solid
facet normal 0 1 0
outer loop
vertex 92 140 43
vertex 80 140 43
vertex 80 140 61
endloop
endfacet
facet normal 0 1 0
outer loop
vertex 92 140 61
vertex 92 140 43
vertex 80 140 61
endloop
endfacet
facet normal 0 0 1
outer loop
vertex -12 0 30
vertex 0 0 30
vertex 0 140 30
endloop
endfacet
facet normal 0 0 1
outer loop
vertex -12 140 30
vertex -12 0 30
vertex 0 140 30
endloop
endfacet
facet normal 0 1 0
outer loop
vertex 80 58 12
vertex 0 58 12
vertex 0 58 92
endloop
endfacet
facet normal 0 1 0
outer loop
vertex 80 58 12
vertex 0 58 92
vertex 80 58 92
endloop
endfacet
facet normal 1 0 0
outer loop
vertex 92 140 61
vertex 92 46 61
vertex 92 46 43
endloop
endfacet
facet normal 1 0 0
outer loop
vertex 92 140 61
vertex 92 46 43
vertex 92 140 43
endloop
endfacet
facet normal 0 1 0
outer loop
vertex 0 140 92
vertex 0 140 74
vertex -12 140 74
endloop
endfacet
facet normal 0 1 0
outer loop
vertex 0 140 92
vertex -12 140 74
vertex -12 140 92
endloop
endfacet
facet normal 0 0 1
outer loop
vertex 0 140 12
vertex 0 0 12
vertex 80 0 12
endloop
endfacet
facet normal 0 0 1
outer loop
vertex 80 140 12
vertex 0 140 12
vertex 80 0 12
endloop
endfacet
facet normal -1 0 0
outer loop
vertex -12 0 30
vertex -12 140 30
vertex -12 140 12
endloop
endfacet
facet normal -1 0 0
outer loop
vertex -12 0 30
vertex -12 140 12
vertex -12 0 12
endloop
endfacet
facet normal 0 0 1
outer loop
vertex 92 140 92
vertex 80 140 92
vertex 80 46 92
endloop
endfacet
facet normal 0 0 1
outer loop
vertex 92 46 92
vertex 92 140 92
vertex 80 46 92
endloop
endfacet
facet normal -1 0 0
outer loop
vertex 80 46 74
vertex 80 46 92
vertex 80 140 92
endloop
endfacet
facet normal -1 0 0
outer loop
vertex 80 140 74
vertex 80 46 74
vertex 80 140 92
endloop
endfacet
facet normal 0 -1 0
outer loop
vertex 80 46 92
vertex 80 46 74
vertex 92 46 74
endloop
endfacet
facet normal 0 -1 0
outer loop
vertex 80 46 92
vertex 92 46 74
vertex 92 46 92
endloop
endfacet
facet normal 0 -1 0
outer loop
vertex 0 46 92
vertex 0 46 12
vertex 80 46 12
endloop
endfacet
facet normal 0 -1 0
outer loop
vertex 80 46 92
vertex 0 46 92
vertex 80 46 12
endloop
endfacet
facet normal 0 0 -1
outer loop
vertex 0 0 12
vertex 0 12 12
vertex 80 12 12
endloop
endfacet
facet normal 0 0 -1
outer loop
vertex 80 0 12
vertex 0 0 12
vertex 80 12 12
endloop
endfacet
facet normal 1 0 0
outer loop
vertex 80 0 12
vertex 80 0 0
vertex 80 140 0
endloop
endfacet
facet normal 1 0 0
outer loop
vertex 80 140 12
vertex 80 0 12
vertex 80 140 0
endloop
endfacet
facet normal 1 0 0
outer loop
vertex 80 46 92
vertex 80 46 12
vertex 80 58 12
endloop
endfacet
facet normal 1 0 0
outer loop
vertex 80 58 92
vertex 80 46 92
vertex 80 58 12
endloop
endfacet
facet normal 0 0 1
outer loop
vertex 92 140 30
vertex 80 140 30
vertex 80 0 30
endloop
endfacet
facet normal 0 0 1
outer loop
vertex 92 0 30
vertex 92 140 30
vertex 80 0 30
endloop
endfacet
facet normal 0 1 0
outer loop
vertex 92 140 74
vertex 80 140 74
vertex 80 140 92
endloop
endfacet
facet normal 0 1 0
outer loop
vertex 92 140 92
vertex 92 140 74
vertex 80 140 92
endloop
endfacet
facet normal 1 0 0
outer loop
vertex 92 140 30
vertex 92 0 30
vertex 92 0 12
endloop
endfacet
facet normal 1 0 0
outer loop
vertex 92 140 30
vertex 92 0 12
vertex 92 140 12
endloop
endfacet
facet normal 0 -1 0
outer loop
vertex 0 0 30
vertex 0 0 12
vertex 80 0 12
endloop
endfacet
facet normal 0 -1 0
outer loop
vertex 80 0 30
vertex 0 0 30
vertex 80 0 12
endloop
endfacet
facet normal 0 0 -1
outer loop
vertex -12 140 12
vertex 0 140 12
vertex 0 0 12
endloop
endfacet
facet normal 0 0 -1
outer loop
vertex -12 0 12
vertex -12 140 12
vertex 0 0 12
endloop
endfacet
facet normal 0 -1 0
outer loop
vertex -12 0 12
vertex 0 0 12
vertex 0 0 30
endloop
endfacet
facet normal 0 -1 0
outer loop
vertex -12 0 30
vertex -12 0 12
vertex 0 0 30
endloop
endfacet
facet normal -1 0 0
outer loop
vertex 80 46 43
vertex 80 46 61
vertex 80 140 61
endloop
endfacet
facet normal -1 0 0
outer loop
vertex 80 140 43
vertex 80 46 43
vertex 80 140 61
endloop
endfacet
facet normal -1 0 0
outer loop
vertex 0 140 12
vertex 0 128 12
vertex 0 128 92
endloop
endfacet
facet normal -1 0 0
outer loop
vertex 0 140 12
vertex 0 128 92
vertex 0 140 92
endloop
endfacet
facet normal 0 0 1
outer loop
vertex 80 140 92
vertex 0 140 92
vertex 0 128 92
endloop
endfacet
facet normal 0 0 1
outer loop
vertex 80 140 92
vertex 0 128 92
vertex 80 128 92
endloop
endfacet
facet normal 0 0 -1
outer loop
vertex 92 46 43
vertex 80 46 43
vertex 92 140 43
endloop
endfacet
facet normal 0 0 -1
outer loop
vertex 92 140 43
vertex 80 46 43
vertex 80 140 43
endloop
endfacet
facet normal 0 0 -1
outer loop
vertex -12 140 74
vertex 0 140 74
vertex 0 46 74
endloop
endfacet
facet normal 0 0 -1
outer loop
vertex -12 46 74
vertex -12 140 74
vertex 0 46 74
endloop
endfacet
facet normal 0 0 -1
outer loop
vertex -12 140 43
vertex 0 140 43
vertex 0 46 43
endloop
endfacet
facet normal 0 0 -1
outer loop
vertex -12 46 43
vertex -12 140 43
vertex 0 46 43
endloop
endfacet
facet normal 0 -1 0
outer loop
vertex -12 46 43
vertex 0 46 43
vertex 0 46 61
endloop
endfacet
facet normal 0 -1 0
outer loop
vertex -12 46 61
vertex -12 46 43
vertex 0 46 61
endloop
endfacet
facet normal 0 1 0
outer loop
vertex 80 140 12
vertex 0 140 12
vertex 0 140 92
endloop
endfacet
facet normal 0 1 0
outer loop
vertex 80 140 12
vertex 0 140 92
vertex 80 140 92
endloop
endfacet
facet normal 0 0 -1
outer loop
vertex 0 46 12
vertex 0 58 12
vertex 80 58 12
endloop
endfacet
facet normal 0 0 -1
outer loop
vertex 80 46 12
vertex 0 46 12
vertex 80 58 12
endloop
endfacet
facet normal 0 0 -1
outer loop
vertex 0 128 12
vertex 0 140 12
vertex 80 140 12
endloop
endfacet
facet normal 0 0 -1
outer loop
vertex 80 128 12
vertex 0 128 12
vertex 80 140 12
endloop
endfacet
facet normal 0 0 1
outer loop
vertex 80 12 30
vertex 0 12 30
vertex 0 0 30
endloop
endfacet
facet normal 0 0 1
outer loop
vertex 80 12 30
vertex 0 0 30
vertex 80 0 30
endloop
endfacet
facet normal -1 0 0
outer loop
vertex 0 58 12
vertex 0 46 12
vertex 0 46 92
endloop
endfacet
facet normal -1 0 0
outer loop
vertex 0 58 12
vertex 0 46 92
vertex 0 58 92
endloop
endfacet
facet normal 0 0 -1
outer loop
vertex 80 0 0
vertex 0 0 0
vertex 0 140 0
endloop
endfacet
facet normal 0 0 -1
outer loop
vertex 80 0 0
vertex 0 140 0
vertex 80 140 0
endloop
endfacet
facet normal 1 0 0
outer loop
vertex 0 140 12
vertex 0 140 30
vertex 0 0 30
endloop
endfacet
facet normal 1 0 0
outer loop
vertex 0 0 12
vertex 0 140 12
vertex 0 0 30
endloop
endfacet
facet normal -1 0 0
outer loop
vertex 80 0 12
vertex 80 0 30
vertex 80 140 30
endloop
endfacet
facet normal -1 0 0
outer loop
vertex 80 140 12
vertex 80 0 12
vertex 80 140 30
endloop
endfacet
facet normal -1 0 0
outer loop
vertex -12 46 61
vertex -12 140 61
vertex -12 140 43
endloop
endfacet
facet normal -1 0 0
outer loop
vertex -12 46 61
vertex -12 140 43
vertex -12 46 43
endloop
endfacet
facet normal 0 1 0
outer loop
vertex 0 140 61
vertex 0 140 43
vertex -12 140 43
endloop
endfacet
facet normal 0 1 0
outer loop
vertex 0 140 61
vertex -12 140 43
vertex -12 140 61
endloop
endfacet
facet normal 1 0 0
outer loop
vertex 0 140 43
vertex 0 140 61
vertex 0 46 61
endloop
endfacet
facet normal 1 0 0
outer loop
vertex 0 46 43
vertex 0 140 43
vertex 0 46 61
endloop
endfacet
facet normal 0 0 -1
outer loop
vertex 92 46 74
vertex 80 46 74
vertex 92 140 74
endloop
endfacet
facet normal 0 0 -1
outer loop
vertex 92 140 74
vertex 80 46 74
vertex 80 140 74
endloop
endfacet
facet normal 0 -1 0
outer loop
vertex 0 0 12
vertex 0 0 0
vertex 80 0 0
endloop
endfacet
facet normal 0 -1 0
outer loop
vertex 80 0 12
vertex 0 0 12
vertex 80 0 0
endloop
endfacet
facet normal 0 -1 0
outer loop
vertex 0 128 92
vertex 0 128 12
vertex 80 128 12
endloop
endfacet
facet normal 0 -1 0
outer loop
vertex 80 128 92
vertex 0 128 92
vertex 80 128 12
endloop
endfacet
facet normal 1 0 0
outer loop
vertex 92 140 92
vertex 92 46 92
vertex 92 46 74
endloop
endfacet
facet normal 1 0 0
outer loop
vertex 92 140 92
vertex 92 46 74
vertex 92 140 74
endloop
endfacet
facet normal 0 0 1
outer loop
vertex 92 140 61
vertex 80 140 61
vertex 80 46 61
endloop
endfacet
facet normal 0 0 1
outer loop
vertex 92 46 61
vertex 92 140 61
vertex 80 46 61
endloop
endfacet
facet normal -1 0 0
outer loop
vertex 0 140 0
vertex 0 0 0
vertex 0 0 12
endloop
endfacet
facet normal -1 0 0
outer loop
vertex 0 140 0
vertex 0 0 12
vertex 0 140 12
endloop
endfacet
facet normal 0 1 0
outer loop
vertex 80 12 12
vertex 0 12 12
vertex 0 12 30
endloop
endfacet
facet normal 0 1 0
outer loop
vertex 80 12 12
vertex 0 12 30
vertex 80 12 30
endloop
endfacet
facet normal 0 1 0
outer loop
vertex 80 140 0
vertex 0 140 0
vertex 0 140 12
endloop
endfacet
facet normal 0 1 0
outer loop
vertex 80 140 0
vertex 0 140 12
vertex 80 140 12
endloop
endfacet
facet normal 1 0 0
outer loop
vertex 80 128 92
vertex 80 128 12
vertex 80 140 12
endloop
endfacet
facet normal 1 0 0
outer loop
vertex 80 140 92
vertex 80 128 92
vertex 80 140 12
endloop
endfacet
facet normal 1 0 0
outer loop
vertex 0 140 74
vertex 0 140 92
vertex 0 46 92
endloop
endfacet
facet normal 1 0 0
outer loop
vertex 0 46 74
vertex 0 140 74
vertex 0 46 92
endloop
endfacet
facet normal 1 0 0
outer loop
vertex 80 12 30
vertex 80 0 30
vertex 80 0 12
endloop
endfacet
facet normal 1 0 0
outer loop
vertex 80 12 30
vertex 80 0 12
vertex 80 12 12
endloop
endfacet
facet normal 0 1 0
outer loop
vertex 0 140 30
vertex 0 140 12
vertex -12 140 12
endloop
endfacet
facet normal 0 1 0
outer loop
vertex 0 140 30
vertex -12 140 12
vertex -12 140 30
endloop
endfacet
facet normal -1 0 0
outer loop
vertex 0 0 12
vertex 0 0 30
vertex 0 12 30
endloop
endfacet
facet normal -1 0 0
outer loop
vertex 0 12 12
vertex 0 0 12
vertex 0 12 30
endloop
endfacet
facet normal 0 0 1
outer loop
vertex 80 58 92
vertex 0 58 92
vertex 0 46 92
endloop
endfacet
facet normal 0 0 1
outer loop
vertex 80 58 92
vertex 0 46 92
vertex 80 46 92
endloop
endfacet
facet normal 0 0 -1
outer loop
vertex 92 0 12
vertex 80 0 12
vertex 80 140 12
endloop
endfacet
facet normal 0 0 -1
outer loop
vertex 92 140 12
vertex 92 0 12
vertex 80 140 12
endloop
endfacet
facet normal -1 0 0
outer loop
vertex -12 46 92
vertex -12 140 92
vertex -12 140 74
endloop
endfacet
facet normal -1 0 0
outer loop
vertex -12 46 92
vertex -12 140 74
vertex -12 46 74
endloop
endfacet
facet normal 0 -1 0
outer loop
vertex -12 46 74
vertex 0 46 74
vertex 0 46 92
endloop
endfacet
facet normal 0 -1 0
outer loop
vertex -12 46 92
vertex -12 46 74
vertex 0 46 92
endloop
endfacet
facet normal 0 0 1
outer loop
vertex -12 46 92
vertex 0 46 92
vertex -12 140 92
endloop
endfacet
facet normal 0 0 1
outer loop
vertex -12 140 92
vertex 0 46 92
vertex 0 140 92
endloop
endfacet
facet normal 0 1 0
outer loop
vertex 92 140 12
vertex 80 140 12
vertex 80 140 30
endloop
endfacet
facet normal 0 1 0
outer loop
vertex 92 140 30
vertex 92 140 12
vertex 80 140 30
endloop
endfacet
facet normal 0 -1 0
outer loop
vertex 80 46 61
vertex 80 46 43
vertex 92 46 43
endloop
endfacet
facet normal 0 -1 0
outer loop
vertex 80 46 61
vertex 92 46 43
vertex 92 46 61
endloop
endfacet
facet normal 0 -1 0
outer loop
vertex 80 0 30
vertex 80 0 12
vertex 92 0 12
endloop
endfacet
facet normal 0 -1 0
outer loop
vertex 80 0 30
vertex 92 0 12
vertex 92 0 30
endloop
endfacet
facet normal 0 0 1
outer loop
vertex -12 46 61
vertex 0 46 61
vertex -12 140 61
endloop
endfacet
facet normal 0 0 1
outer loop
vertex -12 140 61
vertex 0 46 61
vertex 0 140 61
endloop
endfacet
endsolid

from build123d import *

# Parameters (mm, degrees)
F0_W      = 80
F0_H      = 140
F1_DEPTH  = 12
F2_W      = 80
F2_H      = 12
F3_DEPTH  = 80
F4_DEPTH  = 18
F5_W      = 128
F5_H      = 18
F5_W_2    = 12
F6_DEPTH  = 12
F7_W      = 82
F7_H      = 18
F7_W_2    = 12
F8_DEPTH  = 12
F10_W     = 12
F10_H     = 18
F10_W_2   = 82
F9_W      = 12
F9_H      = 18
F9_W_2    = 128
F11_DEPTH = 12


with BuildPart() as f1:
    # F0 (on Top) → F1 (new body)
    with BuildSketch(Plane.XY):
        with Locations((40, 70)):
            Rectangle(F0_W, F0_H)
    extrude(amount=F1_DEPTH)


with BuildPart() as f3:
    # F2 (on face) → F3 (new body)
    with BuildSketch(Plane.XY.offset(12)):
        with Locations((40, 134)):
            Rectangle(F2_W, F2_H)
        with Locations((40, 52)):
            Rectangle(F2_W, F2_H)
    extrude(amount=F3_DEPTH)


with BuildPart() as f4:
    # F2 (on face) → F4 (new body)
    with BuildSketch(Plane.XY.offset(12)):
        with Locations((40, 6)):
            Rectangle(F2_W, F2_H)
    extrude(amount=F4_DEPTH)


with BuildPart() as f6:
    # F5 (on face) → F6 (new body)
    with BuildSketch(Plane.YZ.offset(80)):
        with Locations((76, 21)):
            Rectangle(F5_W, F5_H)
        with Locations((6, 21)):
            Rectangle(F5_W_2, F5_H)
    extrude(amount=F6_DEPTH)


with BuildPart() as f8:
    # F7 (on face) → F8 (new body)
    with BuildSketch(Plane.YZ.offset(80)):
        with Locations((99, 83)):
            Rectangle(F7_W, F7_H)
        with Locations((52, 83)):
            Rectangle(F7_W_2, F7_H)
        with Locations((52, 52)):
            Rectangle(F7_W_2, F7_H)
        with Locations((99, 52)):
            Rectangle(F7_W, F7_H)
    extrude(amount=F8_DEPTH)


with BuildPart() as f11:
    # F10 (on face) + F9 (on face) → F11 (new body)
    with BuildSketch(Plane(origin=(0, 0, 0), x_dir=(0, -1, 0), z_dir=(-1, 0, 0))):
        with Locations((-52, 83)):
            Rectangle(F10_W, F10_H)
        with Locations((-99, 83)):
            Rectangle(F10_W_2, F10_H)
        with Locations((-52, 52)):
            Rectangle(F10_W, F10_H)
        with Locations((-99, 52)):
            Rectangle(F10_W_2, F10_H)
    with BuildSketch(Plane(origin=(0, 0, 0), x_dir=(0, -1, 0), z_dir=(-1, 0, 0))):
        with Locations((-6, 21)):
            Rectangle(F9_W, F9_H)
        with Locations((-76, 21)):
            Rectangle(F9_W_2, F9_H)
    extrude(amount=F11_DEPTH)


solid = Compound([f1.part, f3.part, f4.part, f6.part, f8.part, f11.part])
